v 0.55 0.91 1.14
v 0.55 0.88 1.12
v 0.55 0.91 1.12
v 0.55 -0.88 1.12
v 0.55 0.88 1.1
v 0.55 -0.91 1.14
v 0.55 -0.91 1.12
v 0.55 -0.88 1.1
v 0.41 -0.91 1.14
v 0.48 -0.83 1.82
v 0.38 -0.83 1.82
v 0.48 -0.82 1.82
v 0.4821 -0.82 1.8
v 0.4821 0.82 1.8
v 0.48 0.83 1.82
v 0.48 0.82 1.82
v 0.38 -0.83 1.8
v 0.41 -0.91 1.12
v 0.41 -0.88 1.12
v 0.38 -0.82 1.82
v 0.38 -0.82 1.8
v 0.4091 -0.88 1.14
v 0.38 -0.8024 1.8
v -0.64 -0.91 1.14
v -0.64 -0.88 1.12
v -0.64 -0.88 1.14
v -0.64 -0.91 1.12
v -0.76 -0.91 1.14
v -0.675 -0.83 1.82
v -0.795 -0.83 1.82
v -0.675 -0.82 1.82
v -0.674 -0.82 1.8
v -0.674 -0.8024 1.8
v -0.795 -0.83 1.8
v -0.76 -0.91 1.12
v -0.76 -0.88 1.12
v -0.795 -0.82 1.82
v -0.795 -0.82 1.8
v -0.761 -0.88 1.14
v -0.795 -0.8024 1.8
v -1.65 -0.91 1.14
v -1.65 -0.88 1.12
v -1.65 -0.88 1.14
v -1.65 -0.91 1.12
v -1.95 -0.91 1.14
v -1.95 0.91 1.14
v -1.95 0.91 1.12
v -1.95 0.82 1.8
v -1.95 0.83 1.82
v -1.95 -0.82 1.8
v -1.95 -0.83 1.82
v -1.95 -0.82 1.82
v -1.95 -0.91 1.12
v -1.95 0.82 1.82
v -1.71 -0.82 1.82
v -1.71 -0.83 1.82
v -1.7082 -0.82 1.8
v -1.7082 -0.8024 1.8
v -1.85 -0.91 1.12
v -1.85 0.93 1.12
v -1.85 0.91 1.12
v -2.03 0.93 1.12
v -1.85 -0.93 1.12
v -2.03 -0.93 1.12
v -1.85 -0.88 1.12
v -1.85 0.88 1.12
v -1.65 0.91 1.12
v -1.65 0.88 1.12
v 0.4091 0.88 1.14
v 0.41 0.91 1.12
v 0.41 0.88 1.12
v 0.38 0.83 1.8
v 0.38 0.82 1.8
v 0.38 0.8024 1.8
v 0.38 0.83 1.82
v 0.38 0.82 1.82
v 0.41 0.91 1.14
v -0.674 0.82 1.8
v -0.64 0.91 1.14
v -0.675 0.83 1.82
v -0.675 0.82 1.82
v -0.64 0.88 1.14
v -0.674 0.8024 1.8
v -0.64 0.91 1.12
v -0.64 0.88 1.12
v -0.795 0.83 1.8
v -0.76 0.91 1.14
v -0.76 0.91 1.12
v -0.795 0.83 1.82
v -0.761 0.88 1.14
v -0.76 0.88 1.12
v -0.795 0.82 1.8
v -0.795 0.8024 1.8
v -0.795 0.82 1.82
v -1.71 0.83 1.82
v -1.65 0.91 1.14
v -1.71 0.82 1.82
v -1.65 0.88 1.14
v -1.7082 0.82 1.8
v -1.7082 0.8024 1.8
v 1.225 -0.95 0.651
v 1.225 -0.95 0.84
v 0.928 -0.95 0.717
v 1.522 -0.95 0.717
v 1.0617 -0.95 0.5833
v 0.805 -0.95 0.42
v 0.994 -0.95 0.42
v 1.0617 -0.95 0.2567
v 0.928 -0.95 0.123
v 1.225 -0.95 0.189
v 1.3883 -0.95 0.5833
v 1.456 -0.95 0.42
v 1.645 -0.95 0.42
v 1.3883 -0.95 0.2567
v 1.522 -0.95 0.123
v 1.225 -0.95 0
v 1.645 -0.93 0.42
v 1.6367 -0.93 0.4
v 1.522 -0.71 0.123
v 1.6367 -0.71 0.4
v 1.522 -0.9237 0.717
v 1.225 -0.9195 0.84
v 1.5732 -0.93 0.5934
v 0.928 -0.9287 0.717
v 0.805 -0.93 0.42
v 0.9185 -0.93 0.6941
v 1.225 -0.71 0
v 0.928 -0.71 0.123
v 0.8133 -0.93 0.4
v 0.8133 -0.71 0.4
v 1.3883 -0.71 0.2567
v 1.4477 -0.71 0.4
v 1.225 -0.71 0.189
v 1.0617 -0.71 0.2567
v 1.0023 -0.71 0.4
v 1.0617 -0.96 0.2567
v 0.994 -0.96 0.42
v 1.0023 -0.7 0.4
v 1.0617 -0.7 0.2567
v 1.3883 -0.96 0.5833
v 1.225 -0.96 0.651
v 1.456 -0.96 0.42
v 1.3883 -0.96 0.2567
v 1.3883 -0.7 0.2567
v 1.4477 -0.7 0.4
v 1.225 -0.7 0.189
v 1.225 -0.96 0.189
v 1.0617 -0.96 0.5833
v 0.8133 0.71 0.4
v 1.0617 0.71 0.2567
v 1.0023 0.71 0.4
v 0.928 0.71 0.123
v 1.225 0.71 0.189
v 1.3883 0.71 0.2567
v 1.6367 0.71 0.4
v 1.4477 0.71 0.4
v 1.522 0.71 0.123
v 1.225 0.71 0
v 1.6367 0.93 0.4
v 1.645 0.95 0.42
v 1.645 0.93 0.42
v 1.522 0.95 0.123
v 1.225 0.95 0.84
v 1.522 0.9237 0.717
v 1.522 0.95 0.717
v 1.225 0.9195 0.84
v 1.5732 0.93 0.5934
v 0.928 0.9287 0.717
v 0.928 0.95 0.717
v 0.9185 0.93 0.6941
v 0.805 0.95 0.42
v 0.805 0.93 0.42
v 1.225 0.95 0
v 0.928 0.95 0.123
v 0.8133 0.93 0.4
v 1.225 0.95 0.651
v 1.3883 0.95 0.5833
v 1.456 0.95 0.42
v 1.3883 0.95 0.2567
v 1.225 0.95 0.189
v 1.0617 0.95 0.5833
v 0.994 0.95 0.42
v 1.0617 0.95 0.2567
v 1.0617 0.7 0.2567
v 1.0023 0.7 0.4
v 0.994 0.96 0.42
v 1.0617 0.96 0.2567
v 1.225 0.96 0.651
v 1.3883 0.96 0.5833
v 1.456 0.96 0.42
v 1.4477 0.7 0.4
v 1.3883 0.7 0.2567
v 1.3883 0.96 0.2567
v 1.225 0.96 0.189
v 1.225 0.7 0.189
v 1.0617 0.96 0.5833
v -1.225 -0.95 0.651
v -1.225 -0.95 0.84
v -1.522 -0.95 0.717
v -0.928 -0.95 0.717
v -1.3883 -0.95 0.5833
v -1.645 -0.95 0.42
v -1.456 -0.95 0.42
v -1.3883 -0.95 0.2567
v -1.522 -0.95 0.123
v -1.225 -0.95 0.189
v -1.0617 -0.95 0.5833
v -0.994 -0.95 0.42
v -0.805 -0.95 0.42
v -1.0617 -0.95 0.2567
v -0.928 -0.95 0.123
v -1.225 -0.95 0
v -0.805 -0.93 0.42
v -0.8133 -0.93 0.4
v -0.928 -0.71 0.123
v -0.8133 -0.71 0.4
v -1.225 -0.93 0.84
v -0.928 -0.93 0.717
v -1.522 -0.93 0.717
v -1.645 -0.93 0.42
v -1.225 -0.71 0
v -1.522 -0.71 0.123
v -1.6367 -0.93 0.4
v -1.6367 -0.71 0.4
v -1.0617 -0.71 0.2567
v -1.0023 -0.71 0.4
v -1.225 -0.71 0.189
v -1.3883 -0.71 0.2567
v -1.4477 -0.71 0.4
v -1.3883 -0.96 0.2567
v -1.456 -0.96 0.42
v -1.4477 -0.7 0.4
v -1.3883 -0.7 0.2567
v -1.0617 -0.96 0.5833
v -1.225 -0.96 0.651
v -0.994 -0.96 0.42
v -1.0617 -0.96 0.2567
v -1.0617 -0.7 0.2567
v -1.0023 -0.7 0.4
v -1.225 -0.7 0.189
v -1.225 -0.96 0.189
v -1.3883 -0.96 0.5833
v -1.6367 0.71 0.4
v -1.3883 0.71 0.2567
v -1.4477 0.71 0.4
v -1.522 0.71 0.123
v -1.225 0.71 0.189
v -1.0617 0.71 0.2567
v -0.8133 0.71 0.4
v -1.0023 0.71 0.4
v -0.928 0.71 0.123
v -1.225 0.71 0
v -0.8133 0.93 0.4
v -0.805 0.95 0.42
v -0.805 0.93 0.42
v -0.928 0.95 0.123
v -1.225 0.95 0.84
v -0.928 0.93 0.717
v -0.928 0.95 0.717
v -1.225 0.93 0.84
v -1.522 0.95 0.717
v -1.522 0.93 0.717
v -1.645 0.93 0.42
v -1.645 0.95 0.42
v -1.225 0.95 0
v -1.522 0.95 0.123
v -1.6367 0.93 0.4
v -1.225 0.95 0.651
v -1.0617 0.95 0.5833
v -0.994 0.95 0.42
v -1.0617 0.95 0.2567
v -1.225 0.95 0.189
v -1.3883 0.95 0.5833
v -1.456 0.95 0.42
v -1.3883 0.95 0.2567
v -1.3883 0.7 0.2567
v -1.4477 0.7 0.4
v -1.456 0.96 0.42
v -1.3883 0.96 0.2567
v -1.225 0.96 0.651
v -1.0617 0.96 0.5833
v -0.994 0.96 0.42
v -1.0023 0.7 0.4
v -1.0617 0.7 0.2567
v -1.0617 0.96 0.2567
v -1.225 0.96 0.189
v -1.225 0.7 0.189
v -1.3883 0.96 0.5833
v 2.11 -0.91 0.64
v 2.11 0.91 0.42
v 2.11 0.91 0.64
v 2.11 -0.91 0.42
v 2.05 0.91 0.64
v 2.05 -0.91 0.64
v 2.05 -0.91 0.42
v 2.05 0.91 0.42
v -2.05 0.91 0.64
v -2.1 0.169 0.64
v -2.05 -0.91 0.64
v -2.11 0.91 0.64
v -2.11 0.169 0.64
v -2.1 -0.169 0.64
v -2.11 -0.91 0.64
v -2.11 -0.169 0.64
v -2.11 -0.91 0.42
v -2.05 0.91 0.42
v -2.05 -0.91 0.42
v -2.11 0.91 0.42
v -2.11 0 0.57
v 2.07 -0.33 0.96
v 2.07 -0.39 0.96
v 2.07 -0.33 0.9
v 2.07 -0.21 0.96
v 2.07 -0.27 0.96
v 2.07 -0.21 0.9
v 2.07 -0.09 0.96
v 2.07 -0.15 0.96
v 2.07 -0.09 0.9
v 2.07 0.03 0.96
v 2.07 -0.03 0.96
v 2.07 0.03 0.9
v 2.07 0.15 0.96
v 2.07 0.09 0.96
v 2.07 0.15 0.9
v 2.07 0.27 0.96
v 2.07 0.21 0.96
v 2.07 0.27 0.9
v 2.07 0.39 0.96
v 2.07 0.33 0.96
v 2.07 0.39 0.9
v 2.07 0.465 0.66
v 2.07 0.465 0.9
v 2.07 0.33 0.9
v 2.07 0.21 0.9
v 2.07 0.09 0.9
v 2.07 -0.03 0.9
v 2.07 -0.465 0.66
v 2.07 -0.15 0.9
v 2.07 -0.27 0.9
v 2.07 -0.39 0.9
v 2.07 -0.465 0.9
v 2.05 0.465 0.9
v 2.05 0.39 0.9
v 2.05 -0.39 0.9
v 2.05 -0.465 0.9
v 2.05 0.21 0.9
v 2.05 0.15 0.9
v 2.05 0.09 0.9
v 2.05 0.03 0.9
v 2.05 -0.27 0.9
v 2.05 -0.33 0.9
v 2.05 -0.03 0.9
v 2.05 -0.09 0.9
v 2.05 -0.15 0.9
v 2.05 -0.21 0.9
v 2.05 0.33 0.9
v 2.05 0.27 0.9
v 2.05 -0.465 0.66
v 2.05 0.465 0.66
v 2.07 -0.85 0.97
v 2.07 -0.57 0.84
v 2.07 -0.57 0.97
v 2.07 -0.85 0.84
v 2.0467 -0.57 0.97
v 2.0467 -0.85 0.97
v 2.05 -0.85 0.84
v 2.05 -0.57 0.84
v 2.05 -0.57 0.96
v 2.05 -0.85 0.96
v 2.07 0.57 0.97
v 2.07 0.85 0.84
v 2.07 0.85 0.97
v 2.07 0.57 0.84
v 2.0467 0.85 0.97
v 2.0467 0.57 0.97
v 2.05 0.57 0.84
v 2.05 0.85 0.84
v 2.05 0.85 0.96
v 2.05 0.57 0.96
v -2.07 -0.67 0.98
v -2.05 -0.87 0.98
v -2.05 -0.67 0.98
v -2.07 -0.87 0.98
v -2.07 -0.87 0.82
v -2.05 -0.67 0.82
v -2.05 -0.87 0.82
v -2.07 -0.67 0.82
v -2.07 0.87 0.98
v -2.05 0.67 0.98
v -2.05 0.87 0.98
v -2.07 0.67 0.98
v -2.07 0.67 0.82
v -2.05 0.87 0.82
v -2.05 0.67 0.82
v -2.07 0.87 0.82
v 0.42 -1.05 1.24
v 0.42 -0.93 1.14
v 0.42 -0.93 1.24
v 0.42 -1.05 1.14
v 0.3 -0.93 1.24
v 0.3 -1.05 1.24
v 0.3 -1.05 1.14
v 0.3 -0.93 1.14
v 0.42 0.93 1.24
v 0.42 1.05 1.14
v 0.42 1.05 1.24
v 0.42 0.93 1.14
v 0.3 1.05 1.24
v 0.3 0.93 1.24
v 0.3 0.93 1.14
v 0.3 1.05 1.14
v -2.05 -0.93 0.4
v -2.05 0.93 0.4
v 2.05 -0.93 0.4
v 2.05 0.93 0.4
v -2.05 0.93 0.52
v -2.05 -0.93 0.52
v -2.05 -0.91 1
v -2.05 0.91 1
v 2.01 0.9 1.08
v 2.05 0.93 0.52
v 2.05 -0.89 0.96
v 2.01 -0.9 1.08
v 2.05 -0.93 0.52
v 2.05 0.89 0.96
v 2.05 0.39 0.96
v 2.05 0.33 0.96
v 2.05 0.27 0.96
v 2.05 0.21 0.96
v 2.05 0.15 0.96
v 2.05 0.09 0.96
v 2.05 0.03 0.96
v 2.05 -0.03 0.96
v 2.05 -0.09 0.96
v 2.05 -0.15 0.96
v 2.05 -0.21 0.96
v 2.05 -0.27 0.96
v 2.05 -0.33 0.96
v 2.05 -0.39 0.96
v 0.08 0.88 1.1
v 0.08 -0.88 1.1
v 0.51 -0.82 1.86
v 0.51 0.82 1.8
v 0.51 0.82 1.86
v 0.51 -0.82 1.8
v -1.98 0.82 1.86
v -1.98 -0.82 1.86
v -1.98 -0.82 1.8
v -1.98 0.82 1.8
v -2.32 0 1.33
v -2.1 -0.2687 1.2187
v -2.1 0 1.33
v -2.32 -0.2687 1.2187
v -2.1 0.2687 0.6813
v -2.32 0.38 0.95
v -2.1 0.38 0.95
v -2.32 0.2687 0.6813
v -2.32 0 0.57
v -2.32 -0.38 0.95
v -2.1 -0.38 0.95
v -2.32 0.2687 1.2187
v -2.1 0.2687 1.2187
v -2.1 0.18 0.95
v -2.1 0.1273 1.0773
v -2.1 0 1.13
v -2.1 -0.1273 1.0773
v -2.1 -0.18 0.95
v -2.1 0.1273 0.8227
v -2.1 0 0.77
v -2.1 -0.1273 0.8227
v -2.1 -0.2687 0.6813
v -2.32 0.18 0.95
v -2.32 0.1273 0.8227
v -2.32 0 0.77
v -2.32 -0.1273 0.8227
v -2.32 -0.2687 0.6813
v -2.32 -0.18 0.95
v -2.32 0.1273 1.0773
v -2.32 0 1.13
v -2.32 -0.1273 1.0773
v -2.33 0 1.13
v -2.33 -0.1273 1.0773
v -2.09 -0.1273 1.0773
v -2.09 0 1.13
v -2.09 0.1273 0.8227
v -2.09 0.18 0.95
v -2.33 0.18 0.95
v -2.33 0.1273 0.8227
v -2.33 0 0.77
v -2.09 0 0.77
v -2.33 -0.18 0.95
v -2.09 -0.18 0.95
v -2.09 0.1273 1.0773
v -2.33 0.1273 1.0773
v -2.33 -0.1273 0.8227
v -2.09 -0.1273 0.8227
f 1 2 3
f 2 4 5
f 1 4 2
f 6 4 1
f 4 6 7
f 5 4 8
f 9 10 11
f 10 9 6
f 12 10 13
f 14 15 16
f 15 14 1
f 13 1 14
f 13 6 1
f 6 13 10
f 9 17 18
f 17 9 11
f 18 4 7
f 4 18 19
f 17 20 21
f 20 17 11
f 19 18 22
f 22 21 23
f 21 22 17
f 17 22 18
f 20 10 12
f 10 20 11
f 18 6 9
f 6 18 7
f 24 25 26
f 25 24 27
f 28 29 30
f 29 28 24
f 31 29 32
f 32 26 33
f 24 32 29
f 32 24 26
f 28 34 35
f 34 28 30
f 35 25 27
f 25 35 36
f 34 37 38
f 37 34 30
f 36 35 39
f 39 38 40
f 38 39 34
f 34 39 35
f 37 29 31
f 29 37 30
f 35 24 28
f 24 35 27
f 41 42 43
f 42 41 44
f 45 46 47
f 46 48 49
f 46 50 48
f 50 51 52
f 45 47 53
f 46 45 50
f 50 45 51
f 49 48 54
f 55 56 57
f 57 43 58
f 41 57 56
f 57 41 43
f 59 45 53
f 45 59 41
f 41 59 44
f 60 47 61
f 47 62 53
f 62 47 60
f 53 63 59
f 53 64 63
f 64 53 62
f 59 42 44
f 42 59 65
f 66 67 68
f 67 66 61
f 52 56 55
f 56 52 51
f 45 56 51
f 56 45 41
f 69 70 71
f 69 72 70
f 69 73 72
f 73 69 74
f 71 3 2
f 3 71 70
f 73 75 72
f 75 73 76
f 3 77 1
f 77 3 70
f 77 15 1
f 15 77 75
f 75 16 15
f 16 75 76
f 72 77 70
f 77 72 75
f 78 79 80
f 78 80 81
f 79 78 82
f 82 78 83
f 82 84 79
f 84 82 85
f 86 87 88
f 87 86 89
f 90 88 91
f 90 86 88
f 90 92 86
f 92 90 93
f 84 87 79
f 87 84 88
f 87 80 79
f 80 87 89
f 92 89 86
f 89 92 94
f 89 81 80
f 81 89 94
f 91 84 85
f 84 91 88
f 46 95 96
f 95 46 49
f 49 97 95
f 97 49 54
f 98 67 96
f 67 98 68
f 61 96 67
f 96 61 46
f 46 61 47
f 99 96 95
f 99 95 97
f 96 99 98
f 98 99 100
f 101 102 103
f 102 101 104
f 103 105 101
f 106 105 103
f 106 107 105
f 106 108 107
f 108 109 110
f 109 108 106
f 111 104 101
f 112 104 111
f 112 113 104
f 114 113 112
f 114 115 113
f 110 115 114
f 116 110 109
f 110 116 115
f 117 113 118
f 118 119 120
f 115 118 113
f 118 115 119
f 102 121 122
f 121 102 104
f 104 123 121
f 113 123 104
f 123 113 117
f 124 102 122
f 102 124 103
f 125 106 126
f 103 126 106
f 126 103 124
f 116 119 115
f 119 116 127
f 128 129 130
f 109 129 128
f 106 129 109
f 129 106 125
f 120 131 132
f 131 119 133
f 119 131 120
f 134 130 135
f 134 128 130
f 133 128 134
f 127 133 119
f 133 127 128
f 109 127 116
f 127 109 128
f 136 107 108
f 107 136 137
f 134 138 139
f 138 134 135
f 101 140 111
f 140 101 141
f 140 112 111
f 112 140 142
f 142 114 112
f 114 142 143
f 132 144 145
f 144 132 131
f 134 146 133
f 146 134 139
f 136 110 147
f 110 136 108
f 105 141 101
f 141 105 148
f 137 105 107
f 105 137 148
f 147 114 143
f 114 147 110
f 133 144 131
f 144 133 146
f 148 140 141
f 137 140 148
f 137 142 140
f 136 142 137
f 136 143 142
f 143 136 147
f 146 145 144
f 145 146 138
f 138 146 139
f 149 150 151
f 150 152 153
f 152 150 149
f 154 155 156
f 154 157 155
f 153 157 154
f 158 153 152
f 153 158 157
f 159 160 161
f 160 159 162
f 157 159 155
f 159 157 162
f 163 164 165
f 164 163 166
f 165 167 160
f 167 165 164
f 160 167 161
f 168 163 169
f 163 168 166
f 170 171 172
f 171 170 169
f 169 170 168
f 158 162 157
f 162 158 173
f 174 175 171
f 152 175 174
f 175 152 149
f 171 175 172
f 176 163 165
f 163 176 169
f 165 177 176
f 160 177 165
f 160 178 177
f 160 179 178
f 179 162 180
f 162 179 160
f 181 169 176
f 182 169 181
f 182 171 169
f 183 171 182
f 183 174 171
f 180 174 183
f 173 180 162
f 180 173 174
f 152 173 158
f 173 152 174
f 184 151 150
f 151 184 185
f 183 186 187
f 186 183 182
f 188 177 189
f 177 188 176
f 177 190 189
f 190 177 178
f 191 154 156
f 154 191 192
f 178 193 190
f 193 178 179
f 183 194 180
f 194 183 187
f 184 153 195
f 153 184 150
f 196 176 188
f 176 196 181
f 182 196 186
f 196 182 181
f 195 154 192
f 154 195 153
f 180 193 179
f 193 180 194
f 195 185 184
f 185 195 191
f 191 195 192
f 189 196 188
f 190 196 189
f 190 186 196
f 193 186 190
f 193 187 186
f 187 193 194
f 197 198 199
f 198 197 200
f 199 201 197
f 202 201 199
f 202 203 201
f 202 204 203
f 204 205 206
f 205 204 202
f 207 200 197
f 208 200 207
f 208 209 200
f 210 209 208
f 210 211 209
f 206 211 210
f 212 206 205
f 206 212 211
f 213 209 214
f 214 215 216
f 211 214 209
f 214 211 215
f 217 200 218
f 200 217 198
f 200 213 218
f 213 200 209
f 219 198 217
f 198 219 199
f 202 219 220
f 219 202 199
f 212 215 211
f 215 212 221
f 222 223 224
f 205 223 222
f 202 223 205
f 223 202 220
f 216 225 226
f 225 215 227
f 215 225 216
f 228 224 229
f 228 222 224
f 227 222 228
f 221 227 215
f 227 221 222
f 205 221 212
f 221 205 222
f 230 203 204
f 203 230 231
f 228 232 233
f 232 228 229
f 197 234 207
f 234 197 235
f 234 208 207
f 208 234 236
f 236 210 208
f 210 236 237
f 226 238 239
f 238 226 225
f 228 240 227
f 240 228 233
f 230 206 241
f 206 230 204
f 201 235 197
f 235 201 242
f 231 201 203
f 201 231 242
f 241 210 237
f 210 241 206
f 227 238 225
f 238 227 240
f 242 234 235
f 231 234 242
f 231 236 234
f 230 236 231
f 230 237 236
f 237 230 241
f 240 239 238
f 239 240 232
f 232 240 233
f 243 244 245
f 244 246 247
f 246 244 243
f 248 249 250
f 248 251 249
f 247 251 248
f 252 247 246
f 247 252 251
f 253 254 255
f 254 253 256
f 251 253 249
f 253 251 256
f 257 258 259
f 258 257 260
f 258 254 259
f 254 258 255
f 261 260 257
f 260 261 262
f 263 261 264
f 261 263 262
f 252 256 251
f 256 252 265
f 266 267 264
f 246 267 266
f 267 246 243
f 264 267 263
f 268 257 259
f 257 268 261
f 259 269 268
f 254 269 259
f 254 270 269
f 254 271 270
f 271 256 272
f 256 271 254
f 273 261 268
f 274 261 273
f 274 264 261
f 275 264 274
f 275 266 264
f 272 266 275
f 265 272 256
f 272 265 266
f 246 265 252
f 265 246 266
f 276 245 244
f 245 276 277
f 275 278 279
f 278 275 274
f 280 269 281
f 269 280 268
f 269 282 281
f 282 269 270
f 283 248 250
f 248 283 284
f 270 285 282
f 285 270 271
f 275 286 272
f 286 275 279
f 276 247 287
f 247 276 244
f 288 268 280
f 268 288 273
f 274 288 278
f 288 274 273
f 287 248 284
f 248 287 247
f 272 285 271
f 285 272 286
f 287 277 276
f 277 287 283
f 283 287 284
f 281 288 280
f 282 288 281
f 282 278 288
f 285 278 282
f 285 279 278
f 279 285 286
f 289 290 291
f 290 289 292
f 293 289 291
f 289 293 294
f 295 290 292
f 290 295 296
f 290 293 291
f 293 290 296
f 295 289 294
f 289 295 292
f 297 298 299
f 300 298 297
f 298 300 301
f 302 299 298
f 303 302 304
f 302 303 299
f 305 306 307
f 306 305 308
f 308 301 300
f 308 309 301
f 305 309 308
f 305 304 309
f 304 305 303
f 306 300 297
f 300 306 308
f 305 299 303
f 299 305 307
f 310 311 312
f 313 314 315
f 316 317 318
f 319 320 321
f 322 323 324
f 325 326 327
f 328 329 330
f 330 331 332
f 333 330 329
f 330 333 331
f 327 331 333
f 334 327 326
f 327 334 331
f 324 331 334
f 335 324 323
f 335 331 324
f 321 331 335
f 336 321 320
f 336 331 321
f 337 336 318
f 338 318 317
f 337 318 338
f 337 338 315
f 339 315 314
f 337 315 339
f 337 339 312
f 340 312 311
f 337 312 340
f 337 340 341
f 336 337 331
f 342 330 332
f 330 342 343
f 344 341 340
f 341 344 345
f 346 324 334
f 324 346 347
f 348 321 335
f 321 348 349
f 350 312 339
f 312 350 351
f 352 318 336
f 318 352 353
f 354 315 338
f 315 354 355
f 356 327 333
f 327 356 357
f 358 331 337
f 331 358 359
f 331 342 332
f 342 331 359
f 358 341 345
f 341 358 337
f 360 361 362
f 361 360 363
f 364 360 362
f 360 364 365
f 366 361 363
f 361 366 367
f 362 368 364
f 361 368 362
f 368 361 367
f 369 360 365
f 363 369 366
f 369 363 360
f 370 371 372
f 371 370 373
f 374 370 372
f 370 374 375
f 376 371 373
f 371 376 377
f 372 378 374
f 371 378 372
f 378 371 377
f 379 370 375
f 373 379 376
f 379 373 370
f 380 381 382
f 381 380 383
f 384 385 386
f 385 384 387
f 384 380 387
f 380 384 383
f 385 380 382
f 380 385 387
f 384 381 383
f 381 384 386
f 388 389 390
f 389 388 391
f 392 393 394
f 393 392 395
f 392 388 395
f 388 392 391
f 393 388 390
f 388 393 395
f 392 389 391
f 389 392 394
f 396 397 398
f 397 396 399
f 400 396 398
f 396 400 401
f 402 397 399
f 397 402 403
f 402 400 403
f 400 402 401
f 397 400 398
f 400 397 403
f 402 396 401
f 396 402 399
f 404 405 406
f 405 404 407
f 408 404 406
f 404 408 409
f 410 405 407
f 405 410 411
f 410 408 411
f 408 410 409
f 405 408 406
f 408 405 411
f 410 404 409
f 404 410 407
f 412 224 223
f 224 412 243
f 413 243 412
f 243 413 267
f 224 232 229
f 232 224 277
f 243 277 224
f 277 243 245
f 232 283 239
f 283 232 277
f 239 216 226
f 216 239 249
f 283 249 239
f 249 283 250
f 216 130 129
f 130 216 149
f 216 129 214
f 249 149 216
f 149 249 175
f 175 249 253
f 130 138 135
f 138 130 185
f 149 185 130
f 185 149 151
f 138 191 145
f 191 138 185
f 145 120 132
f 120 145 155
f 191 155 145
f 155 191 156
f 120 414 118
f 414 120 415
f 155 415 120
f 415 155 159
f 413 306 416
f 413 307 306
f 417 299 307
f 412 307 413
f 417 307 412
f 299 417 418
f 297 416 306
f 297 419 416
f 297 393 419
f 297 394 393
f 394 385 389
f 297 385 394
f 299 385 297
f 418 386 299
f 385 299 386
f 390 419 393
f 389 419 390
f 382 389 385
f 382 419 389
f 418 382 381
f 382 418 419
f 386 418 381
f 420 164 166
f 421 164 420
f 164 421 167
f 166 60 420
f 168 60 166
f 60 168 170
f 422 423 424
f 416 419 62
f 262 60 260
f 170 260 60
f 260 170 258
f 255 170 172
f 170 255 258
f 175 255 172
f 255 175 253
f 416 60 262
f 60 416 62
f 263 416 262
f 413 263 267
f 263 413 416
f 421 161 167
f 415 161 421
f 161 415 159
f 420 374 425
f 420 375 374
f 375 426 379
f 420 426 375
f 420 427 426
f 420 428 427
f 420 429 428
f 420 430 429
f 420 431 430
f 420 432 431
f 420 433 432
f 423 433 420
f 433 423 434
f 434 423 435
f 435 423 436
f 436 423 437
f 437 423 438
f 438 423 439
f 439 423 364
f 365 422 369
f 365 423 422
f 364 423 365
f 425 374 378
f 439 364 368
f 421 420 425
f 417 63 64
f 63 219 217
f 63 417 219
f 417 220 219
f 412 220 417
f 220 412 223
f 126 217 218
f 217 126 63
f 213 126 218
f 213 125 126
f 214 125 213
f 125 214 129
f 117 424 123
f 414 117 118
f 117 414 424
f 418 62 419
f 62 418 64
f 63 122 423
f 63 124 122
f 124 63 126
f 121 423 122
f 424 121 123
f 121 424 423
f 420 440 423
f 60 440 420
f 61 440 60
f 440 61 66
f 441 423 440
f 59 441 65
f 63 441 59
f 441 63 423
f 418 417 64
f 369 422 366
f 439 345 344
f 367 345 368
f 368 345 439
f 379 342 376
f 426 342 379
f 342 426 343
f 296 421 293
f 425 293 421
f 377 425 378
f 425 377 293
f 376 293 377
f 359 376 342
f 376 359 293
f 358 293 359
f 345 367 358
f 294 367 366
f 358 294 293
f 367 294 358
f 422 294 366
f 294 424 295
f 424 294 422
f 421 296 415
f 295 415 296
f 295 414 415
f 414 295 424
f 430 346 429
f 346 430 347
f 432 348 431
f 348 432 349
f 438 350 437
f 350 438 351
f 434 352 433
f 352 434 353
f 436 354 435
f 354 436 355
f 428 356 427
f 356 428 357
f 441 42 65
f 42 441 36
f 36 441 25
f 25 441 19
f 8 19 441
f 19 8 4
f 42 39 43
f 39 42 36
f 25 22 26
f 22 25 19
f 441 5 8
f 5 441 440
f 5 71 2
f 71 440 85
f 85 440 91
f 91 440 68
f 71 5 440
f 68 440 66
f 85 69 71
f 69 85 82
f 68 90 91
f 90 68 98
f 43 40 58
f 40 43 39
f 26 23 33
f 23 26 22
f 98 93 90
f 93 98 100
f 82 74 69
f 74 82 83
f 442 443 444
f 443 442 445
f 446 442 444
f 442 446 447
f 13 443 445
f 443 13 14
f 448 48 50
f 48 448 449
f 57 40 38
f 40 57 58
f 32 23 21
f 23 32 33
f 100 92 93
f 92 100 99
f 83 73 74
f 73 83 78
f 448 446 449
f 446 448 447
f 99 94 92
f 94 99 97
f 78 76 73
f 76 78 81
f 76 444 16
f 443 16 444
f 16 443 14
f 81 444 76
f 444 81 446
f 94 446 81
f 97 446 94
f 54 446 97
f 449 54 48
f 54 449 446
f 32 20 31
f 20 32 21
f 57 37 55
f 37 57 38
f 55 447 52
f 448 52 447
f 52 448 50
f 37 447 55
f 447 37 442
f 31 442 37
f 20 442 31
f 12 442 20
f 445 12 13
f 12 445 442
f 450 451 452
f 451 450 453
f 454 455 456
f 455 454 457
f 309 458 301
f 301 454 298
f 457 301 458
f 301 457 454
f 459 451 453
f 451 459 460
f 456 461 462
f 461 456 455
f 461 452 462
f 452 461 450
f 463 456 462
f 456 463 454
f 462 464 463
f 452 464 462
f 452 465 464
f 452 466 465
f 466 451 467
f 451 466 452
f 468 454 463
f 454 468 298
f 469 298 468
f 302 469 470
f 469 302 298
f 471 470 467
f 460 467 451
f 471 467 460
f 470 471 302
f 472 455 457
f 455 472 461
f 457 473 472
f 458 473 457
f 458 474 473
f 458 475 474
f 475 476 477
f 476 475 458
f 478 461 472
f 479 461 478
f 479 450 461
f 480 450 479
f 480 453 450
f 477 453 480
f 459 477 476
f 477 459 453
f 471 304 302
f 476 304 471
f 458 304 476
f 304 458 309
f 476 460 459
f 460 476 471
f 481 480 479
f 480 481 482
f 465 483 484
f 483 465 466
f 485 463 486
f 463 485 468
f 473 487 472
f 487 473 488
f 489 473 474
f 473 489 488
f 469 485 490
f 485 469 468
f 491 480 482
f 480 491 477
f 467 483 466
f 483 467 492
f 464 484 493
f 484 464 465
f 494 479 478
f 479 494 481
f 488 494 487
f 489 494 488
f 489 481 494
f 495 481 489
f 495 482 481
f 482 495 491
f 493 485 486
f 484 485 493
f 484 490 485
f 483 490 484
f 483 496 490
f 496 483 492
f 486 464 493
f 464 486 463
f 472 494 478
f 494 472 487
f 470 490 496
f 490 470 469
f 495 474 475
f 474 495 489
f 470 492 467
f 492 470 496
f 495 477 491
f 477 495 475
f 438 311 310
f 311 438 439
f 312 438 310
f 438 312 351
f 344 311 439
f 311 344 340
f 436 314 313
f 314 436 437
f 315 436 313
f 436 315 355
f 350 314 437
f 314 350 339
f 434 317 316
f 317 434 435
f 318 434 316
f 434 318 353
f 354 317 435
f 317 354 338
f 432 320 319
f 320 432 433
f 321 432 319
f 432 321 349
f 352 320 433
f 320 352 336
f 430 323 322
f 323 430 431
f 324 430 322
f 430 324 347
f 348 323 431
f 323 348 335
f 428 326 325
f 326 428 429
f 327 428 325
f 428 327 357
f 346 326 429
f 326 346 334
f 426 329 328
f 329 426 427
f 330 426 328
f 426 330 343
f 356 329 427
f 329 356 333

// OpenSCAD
// file: lib/car_kit.scad
// Car kit — the parts every road vehicle shares (car_sedan.scad,
// car_minisuv.scad, car_suv.scad, car_jeep.scad, car_van.scad), which
// differ in their proportions. world.CarKind names them; the renderer
// draws each kind from its own mesh, tinted per car, with a roof rack or
// box (car_roof_rack.scad, car_roof_box.scad) set on the roof at the
// height in render.carRoofs.
//
//   +X = forward (the car's front faces +X)
//   +Y = lateral (driver's left when facing +X)
//   +Z = up
//
// The paint is near white so the per-car tint is the paint colour;
// glass, tyres, trim and lights are dark or bright enough to read
// through any tint.
//
// Conventions, units, and axis docs: see models-src/README.md.

$fn = 8;

paint  = [0.92, 0.92, 0.92];
glass  = [0.30, 0.40, 0.50];
trim   = [0.16, 0.16, 0.17]; // bumpers, grille, rails, mirrors
tyre   = [0.08, 0.08, 0.08];
hubcap = [0.55, 0.56, 0.58];
lamp   = [1.00, 0.96, 0.82];
tail   = [0.80, 0.12, 0.10];

// slab is a thin box from x0 to x1, centred in Y, its top at z.
module slab(x0, x1, w, z, t = 0.04) {
    translate([x0, -w / 2, z - t]) cube([x1 - x0, w, t]);
}

module wheel(x, y, r, t) {
    translate([x, y, r]) rotate([90, 0, 0]) {
        color(tyre) cylinder(h = t, r = r, center = true);
        color(hubcap) cylinder(h = t + 0.02, r = r * 0.55, center = true);
    }
}

// vehicle draws one car.
//   len, w        overall body length and width
//   r, wb         wheel radius and wheelbase (axles centred on x = axle_x)
//   sill          height of the body's underside
//   belt          the beltline: top of the doors, bottom of the glass
//   hood          top of the hood at the nose (below belt slopes it)
//   nose, tailin  how far the top of the body is drawn in from the
//                 front and back ends (rounding them)
//   roof          roof height
//   gb            [x0, x1] the glass at the beltline
//   gr            [x0, x1] the glass at the roof
//   rails         roof rails (SUVs)
module vehicle(len, w, r, wb, sill, belt, hood, nose, tailin, roof, gb, gr,
               axle_x = 0, rails = false) {
    // Body: a hull from the full-length underside to the beltline at the
    // back and the hood at the nose.
    color(paint) hull() {
        slab(-len / 2, len / 2, w, sill + 0.12, 0.12);
        slab(-len / 2 + tailin, gb[0] + 0.1, w, belt);
        slab(gb[1] - 0.1, len / 2 - nose, w - 0.06, hood);
        slab(-len / 2, -len / 2 + 0.05, w - 0.04, belt - 0.12);
        slab(len / 2 - 0.05, len / 2, w - 0.08, hood - 0.12);
    }
    // Glass greenhouse, and the painted roof on it.
    color(glass) hull() {
        slab(gb[0], gb[1], w - 0.10, belt + 0.02, 0.04);
        slab(gr[0], gr[1], w - 0.26, roof - 0.04, 0.04);
    }
    color(paint) slab(gr[0] - 0.03, gr[1] + 0.03, w - 0.22, roof, 0.06);
    // Pillars down the sides of the glass: the windshield's (A), between
    // the doors (B), and a broad one at the back (C).
    color(paint) for (s = [-1, 1]) {
        pillar(gb[1] - 0.14, gb[1], gr[1] - 0.10, gr[1], s);
        pillar((gb[0] + gb[1]) / 2 - 0.06, (gb[0] + gb[1]) / 2 + 0.06,
               (gr[0] + gr[1]) / 2 - 0.06, (gr[0] + gr[1]) / 2 + 0.06, s);
        pillar(gb[0], gb[0] + 0.30, gr[0], gr[0] + 0.24, s);
    }
    module pillar(b0, b1, r0, r1, s) hull() {
        translate([b0, s * (w - 0.10) / 2 - 0.03, belt]) cube([b1 - b0, 0.06, 0.02]);
        translate([r0, s * (w - 0.26) / 2 - 0.03, roof - 0.06]) cube([r1 - r0, 0.06, 0.02]);
    }
    if (rails)
        color(trim) for (s = [-1, 1])
            translate([gr[0] + 0.05, s * (w / 2 - 0.2) - 0.03, roof])
                cube([gr[1] - gr[0] - 0.1, 0.06, 0.06]);

    // Wheels, flush with the body sides.
    t = 0.24;
    for (x = [axle_x + wb / 2, axle_x - wb / 2], s = [-1, 1])
        wheel(x, s * (w / 2 - t / 2 + 0.02), r, t);

    // Bumpers, grille, lights.
    bz = sill + 0.02;
    color(trim) {
        translate([len / 2 - 0.08, -w / 2 + 0.02, bz]) cube([0.14, w - 0.04, 0.22]);
        translate([-len / 2 - 0.06, -w / 2 + 0.02, bz]) cube([0.14, w - 0.04, 0.22]);
        translate([len / 2 - 0.03, -w * 0.25, bz + 0.24]) cube([0.05, w * 0.5, max(hood - bz - 0.42, 0.12)]);
    }
    lz = hood - 0.16;
    color(lamp) for (s = [-1, 1])
        translate([len / 2 - 0.04, s * (w / 2 - 0.22) - 0.14, lz - 0.08]) cube([0.06, 0.28, 0.13]);
    color(tail) for (s = [-1, 1])
        translate([-len / 2 - 0.02, s * (w / 2 - 0.16) - 0.10, belt - 0.30]) cube([0.06, 0.20, 0.16]);
    // Mirrors.
    color(trim) for (s = [-1, 1])
        translate([gb[1] - 0.25, s * (w / 2 + 0.06) - 0.06, belt + 0.02]) cube([0.12, 0.12, 0.10]);

    echo("MOGUL_META", "footprint", len / 2, w / 2 + 0.08);
}
// main file
// Jeep — a short, boxy off-roader: upright windshield, flat hood, chunky
// tyres, a spare wheel on the tailgate. Seats four. Parts and
// conventions: lib/car_kit.scad.
include <lib/car_kit.scad>

len = 4.10;
vehicle(len = len, w = 1.86, r = 0.42, wb = 2.45, sill = 0.40,
        belt = 1.12, hood = 1.08, nose = 0.04, tailin = 0.02,
        roof = 1.86, gb = [-1.95, 0.55], gr = [-1.95, 0.48]);

// Spare wheel on the tailgate.
translate([-len / 2 - 0.16, 0, 0.95]) rotate([0, 90, 0]) {
    color(tyre) cylinder(h = 0.22, r = 0.38, center = true);
    color(hubcap) cylinder(h = 0.24, r = 0.18, center = true);
}
// Grille slots across the nose.
color(trim) for (i = [-3:3])
    translate([len / 2 - 0.02, i * 0.12 - 0.03, 0.70]) cube([0.04, 0.06, 0.26]);
